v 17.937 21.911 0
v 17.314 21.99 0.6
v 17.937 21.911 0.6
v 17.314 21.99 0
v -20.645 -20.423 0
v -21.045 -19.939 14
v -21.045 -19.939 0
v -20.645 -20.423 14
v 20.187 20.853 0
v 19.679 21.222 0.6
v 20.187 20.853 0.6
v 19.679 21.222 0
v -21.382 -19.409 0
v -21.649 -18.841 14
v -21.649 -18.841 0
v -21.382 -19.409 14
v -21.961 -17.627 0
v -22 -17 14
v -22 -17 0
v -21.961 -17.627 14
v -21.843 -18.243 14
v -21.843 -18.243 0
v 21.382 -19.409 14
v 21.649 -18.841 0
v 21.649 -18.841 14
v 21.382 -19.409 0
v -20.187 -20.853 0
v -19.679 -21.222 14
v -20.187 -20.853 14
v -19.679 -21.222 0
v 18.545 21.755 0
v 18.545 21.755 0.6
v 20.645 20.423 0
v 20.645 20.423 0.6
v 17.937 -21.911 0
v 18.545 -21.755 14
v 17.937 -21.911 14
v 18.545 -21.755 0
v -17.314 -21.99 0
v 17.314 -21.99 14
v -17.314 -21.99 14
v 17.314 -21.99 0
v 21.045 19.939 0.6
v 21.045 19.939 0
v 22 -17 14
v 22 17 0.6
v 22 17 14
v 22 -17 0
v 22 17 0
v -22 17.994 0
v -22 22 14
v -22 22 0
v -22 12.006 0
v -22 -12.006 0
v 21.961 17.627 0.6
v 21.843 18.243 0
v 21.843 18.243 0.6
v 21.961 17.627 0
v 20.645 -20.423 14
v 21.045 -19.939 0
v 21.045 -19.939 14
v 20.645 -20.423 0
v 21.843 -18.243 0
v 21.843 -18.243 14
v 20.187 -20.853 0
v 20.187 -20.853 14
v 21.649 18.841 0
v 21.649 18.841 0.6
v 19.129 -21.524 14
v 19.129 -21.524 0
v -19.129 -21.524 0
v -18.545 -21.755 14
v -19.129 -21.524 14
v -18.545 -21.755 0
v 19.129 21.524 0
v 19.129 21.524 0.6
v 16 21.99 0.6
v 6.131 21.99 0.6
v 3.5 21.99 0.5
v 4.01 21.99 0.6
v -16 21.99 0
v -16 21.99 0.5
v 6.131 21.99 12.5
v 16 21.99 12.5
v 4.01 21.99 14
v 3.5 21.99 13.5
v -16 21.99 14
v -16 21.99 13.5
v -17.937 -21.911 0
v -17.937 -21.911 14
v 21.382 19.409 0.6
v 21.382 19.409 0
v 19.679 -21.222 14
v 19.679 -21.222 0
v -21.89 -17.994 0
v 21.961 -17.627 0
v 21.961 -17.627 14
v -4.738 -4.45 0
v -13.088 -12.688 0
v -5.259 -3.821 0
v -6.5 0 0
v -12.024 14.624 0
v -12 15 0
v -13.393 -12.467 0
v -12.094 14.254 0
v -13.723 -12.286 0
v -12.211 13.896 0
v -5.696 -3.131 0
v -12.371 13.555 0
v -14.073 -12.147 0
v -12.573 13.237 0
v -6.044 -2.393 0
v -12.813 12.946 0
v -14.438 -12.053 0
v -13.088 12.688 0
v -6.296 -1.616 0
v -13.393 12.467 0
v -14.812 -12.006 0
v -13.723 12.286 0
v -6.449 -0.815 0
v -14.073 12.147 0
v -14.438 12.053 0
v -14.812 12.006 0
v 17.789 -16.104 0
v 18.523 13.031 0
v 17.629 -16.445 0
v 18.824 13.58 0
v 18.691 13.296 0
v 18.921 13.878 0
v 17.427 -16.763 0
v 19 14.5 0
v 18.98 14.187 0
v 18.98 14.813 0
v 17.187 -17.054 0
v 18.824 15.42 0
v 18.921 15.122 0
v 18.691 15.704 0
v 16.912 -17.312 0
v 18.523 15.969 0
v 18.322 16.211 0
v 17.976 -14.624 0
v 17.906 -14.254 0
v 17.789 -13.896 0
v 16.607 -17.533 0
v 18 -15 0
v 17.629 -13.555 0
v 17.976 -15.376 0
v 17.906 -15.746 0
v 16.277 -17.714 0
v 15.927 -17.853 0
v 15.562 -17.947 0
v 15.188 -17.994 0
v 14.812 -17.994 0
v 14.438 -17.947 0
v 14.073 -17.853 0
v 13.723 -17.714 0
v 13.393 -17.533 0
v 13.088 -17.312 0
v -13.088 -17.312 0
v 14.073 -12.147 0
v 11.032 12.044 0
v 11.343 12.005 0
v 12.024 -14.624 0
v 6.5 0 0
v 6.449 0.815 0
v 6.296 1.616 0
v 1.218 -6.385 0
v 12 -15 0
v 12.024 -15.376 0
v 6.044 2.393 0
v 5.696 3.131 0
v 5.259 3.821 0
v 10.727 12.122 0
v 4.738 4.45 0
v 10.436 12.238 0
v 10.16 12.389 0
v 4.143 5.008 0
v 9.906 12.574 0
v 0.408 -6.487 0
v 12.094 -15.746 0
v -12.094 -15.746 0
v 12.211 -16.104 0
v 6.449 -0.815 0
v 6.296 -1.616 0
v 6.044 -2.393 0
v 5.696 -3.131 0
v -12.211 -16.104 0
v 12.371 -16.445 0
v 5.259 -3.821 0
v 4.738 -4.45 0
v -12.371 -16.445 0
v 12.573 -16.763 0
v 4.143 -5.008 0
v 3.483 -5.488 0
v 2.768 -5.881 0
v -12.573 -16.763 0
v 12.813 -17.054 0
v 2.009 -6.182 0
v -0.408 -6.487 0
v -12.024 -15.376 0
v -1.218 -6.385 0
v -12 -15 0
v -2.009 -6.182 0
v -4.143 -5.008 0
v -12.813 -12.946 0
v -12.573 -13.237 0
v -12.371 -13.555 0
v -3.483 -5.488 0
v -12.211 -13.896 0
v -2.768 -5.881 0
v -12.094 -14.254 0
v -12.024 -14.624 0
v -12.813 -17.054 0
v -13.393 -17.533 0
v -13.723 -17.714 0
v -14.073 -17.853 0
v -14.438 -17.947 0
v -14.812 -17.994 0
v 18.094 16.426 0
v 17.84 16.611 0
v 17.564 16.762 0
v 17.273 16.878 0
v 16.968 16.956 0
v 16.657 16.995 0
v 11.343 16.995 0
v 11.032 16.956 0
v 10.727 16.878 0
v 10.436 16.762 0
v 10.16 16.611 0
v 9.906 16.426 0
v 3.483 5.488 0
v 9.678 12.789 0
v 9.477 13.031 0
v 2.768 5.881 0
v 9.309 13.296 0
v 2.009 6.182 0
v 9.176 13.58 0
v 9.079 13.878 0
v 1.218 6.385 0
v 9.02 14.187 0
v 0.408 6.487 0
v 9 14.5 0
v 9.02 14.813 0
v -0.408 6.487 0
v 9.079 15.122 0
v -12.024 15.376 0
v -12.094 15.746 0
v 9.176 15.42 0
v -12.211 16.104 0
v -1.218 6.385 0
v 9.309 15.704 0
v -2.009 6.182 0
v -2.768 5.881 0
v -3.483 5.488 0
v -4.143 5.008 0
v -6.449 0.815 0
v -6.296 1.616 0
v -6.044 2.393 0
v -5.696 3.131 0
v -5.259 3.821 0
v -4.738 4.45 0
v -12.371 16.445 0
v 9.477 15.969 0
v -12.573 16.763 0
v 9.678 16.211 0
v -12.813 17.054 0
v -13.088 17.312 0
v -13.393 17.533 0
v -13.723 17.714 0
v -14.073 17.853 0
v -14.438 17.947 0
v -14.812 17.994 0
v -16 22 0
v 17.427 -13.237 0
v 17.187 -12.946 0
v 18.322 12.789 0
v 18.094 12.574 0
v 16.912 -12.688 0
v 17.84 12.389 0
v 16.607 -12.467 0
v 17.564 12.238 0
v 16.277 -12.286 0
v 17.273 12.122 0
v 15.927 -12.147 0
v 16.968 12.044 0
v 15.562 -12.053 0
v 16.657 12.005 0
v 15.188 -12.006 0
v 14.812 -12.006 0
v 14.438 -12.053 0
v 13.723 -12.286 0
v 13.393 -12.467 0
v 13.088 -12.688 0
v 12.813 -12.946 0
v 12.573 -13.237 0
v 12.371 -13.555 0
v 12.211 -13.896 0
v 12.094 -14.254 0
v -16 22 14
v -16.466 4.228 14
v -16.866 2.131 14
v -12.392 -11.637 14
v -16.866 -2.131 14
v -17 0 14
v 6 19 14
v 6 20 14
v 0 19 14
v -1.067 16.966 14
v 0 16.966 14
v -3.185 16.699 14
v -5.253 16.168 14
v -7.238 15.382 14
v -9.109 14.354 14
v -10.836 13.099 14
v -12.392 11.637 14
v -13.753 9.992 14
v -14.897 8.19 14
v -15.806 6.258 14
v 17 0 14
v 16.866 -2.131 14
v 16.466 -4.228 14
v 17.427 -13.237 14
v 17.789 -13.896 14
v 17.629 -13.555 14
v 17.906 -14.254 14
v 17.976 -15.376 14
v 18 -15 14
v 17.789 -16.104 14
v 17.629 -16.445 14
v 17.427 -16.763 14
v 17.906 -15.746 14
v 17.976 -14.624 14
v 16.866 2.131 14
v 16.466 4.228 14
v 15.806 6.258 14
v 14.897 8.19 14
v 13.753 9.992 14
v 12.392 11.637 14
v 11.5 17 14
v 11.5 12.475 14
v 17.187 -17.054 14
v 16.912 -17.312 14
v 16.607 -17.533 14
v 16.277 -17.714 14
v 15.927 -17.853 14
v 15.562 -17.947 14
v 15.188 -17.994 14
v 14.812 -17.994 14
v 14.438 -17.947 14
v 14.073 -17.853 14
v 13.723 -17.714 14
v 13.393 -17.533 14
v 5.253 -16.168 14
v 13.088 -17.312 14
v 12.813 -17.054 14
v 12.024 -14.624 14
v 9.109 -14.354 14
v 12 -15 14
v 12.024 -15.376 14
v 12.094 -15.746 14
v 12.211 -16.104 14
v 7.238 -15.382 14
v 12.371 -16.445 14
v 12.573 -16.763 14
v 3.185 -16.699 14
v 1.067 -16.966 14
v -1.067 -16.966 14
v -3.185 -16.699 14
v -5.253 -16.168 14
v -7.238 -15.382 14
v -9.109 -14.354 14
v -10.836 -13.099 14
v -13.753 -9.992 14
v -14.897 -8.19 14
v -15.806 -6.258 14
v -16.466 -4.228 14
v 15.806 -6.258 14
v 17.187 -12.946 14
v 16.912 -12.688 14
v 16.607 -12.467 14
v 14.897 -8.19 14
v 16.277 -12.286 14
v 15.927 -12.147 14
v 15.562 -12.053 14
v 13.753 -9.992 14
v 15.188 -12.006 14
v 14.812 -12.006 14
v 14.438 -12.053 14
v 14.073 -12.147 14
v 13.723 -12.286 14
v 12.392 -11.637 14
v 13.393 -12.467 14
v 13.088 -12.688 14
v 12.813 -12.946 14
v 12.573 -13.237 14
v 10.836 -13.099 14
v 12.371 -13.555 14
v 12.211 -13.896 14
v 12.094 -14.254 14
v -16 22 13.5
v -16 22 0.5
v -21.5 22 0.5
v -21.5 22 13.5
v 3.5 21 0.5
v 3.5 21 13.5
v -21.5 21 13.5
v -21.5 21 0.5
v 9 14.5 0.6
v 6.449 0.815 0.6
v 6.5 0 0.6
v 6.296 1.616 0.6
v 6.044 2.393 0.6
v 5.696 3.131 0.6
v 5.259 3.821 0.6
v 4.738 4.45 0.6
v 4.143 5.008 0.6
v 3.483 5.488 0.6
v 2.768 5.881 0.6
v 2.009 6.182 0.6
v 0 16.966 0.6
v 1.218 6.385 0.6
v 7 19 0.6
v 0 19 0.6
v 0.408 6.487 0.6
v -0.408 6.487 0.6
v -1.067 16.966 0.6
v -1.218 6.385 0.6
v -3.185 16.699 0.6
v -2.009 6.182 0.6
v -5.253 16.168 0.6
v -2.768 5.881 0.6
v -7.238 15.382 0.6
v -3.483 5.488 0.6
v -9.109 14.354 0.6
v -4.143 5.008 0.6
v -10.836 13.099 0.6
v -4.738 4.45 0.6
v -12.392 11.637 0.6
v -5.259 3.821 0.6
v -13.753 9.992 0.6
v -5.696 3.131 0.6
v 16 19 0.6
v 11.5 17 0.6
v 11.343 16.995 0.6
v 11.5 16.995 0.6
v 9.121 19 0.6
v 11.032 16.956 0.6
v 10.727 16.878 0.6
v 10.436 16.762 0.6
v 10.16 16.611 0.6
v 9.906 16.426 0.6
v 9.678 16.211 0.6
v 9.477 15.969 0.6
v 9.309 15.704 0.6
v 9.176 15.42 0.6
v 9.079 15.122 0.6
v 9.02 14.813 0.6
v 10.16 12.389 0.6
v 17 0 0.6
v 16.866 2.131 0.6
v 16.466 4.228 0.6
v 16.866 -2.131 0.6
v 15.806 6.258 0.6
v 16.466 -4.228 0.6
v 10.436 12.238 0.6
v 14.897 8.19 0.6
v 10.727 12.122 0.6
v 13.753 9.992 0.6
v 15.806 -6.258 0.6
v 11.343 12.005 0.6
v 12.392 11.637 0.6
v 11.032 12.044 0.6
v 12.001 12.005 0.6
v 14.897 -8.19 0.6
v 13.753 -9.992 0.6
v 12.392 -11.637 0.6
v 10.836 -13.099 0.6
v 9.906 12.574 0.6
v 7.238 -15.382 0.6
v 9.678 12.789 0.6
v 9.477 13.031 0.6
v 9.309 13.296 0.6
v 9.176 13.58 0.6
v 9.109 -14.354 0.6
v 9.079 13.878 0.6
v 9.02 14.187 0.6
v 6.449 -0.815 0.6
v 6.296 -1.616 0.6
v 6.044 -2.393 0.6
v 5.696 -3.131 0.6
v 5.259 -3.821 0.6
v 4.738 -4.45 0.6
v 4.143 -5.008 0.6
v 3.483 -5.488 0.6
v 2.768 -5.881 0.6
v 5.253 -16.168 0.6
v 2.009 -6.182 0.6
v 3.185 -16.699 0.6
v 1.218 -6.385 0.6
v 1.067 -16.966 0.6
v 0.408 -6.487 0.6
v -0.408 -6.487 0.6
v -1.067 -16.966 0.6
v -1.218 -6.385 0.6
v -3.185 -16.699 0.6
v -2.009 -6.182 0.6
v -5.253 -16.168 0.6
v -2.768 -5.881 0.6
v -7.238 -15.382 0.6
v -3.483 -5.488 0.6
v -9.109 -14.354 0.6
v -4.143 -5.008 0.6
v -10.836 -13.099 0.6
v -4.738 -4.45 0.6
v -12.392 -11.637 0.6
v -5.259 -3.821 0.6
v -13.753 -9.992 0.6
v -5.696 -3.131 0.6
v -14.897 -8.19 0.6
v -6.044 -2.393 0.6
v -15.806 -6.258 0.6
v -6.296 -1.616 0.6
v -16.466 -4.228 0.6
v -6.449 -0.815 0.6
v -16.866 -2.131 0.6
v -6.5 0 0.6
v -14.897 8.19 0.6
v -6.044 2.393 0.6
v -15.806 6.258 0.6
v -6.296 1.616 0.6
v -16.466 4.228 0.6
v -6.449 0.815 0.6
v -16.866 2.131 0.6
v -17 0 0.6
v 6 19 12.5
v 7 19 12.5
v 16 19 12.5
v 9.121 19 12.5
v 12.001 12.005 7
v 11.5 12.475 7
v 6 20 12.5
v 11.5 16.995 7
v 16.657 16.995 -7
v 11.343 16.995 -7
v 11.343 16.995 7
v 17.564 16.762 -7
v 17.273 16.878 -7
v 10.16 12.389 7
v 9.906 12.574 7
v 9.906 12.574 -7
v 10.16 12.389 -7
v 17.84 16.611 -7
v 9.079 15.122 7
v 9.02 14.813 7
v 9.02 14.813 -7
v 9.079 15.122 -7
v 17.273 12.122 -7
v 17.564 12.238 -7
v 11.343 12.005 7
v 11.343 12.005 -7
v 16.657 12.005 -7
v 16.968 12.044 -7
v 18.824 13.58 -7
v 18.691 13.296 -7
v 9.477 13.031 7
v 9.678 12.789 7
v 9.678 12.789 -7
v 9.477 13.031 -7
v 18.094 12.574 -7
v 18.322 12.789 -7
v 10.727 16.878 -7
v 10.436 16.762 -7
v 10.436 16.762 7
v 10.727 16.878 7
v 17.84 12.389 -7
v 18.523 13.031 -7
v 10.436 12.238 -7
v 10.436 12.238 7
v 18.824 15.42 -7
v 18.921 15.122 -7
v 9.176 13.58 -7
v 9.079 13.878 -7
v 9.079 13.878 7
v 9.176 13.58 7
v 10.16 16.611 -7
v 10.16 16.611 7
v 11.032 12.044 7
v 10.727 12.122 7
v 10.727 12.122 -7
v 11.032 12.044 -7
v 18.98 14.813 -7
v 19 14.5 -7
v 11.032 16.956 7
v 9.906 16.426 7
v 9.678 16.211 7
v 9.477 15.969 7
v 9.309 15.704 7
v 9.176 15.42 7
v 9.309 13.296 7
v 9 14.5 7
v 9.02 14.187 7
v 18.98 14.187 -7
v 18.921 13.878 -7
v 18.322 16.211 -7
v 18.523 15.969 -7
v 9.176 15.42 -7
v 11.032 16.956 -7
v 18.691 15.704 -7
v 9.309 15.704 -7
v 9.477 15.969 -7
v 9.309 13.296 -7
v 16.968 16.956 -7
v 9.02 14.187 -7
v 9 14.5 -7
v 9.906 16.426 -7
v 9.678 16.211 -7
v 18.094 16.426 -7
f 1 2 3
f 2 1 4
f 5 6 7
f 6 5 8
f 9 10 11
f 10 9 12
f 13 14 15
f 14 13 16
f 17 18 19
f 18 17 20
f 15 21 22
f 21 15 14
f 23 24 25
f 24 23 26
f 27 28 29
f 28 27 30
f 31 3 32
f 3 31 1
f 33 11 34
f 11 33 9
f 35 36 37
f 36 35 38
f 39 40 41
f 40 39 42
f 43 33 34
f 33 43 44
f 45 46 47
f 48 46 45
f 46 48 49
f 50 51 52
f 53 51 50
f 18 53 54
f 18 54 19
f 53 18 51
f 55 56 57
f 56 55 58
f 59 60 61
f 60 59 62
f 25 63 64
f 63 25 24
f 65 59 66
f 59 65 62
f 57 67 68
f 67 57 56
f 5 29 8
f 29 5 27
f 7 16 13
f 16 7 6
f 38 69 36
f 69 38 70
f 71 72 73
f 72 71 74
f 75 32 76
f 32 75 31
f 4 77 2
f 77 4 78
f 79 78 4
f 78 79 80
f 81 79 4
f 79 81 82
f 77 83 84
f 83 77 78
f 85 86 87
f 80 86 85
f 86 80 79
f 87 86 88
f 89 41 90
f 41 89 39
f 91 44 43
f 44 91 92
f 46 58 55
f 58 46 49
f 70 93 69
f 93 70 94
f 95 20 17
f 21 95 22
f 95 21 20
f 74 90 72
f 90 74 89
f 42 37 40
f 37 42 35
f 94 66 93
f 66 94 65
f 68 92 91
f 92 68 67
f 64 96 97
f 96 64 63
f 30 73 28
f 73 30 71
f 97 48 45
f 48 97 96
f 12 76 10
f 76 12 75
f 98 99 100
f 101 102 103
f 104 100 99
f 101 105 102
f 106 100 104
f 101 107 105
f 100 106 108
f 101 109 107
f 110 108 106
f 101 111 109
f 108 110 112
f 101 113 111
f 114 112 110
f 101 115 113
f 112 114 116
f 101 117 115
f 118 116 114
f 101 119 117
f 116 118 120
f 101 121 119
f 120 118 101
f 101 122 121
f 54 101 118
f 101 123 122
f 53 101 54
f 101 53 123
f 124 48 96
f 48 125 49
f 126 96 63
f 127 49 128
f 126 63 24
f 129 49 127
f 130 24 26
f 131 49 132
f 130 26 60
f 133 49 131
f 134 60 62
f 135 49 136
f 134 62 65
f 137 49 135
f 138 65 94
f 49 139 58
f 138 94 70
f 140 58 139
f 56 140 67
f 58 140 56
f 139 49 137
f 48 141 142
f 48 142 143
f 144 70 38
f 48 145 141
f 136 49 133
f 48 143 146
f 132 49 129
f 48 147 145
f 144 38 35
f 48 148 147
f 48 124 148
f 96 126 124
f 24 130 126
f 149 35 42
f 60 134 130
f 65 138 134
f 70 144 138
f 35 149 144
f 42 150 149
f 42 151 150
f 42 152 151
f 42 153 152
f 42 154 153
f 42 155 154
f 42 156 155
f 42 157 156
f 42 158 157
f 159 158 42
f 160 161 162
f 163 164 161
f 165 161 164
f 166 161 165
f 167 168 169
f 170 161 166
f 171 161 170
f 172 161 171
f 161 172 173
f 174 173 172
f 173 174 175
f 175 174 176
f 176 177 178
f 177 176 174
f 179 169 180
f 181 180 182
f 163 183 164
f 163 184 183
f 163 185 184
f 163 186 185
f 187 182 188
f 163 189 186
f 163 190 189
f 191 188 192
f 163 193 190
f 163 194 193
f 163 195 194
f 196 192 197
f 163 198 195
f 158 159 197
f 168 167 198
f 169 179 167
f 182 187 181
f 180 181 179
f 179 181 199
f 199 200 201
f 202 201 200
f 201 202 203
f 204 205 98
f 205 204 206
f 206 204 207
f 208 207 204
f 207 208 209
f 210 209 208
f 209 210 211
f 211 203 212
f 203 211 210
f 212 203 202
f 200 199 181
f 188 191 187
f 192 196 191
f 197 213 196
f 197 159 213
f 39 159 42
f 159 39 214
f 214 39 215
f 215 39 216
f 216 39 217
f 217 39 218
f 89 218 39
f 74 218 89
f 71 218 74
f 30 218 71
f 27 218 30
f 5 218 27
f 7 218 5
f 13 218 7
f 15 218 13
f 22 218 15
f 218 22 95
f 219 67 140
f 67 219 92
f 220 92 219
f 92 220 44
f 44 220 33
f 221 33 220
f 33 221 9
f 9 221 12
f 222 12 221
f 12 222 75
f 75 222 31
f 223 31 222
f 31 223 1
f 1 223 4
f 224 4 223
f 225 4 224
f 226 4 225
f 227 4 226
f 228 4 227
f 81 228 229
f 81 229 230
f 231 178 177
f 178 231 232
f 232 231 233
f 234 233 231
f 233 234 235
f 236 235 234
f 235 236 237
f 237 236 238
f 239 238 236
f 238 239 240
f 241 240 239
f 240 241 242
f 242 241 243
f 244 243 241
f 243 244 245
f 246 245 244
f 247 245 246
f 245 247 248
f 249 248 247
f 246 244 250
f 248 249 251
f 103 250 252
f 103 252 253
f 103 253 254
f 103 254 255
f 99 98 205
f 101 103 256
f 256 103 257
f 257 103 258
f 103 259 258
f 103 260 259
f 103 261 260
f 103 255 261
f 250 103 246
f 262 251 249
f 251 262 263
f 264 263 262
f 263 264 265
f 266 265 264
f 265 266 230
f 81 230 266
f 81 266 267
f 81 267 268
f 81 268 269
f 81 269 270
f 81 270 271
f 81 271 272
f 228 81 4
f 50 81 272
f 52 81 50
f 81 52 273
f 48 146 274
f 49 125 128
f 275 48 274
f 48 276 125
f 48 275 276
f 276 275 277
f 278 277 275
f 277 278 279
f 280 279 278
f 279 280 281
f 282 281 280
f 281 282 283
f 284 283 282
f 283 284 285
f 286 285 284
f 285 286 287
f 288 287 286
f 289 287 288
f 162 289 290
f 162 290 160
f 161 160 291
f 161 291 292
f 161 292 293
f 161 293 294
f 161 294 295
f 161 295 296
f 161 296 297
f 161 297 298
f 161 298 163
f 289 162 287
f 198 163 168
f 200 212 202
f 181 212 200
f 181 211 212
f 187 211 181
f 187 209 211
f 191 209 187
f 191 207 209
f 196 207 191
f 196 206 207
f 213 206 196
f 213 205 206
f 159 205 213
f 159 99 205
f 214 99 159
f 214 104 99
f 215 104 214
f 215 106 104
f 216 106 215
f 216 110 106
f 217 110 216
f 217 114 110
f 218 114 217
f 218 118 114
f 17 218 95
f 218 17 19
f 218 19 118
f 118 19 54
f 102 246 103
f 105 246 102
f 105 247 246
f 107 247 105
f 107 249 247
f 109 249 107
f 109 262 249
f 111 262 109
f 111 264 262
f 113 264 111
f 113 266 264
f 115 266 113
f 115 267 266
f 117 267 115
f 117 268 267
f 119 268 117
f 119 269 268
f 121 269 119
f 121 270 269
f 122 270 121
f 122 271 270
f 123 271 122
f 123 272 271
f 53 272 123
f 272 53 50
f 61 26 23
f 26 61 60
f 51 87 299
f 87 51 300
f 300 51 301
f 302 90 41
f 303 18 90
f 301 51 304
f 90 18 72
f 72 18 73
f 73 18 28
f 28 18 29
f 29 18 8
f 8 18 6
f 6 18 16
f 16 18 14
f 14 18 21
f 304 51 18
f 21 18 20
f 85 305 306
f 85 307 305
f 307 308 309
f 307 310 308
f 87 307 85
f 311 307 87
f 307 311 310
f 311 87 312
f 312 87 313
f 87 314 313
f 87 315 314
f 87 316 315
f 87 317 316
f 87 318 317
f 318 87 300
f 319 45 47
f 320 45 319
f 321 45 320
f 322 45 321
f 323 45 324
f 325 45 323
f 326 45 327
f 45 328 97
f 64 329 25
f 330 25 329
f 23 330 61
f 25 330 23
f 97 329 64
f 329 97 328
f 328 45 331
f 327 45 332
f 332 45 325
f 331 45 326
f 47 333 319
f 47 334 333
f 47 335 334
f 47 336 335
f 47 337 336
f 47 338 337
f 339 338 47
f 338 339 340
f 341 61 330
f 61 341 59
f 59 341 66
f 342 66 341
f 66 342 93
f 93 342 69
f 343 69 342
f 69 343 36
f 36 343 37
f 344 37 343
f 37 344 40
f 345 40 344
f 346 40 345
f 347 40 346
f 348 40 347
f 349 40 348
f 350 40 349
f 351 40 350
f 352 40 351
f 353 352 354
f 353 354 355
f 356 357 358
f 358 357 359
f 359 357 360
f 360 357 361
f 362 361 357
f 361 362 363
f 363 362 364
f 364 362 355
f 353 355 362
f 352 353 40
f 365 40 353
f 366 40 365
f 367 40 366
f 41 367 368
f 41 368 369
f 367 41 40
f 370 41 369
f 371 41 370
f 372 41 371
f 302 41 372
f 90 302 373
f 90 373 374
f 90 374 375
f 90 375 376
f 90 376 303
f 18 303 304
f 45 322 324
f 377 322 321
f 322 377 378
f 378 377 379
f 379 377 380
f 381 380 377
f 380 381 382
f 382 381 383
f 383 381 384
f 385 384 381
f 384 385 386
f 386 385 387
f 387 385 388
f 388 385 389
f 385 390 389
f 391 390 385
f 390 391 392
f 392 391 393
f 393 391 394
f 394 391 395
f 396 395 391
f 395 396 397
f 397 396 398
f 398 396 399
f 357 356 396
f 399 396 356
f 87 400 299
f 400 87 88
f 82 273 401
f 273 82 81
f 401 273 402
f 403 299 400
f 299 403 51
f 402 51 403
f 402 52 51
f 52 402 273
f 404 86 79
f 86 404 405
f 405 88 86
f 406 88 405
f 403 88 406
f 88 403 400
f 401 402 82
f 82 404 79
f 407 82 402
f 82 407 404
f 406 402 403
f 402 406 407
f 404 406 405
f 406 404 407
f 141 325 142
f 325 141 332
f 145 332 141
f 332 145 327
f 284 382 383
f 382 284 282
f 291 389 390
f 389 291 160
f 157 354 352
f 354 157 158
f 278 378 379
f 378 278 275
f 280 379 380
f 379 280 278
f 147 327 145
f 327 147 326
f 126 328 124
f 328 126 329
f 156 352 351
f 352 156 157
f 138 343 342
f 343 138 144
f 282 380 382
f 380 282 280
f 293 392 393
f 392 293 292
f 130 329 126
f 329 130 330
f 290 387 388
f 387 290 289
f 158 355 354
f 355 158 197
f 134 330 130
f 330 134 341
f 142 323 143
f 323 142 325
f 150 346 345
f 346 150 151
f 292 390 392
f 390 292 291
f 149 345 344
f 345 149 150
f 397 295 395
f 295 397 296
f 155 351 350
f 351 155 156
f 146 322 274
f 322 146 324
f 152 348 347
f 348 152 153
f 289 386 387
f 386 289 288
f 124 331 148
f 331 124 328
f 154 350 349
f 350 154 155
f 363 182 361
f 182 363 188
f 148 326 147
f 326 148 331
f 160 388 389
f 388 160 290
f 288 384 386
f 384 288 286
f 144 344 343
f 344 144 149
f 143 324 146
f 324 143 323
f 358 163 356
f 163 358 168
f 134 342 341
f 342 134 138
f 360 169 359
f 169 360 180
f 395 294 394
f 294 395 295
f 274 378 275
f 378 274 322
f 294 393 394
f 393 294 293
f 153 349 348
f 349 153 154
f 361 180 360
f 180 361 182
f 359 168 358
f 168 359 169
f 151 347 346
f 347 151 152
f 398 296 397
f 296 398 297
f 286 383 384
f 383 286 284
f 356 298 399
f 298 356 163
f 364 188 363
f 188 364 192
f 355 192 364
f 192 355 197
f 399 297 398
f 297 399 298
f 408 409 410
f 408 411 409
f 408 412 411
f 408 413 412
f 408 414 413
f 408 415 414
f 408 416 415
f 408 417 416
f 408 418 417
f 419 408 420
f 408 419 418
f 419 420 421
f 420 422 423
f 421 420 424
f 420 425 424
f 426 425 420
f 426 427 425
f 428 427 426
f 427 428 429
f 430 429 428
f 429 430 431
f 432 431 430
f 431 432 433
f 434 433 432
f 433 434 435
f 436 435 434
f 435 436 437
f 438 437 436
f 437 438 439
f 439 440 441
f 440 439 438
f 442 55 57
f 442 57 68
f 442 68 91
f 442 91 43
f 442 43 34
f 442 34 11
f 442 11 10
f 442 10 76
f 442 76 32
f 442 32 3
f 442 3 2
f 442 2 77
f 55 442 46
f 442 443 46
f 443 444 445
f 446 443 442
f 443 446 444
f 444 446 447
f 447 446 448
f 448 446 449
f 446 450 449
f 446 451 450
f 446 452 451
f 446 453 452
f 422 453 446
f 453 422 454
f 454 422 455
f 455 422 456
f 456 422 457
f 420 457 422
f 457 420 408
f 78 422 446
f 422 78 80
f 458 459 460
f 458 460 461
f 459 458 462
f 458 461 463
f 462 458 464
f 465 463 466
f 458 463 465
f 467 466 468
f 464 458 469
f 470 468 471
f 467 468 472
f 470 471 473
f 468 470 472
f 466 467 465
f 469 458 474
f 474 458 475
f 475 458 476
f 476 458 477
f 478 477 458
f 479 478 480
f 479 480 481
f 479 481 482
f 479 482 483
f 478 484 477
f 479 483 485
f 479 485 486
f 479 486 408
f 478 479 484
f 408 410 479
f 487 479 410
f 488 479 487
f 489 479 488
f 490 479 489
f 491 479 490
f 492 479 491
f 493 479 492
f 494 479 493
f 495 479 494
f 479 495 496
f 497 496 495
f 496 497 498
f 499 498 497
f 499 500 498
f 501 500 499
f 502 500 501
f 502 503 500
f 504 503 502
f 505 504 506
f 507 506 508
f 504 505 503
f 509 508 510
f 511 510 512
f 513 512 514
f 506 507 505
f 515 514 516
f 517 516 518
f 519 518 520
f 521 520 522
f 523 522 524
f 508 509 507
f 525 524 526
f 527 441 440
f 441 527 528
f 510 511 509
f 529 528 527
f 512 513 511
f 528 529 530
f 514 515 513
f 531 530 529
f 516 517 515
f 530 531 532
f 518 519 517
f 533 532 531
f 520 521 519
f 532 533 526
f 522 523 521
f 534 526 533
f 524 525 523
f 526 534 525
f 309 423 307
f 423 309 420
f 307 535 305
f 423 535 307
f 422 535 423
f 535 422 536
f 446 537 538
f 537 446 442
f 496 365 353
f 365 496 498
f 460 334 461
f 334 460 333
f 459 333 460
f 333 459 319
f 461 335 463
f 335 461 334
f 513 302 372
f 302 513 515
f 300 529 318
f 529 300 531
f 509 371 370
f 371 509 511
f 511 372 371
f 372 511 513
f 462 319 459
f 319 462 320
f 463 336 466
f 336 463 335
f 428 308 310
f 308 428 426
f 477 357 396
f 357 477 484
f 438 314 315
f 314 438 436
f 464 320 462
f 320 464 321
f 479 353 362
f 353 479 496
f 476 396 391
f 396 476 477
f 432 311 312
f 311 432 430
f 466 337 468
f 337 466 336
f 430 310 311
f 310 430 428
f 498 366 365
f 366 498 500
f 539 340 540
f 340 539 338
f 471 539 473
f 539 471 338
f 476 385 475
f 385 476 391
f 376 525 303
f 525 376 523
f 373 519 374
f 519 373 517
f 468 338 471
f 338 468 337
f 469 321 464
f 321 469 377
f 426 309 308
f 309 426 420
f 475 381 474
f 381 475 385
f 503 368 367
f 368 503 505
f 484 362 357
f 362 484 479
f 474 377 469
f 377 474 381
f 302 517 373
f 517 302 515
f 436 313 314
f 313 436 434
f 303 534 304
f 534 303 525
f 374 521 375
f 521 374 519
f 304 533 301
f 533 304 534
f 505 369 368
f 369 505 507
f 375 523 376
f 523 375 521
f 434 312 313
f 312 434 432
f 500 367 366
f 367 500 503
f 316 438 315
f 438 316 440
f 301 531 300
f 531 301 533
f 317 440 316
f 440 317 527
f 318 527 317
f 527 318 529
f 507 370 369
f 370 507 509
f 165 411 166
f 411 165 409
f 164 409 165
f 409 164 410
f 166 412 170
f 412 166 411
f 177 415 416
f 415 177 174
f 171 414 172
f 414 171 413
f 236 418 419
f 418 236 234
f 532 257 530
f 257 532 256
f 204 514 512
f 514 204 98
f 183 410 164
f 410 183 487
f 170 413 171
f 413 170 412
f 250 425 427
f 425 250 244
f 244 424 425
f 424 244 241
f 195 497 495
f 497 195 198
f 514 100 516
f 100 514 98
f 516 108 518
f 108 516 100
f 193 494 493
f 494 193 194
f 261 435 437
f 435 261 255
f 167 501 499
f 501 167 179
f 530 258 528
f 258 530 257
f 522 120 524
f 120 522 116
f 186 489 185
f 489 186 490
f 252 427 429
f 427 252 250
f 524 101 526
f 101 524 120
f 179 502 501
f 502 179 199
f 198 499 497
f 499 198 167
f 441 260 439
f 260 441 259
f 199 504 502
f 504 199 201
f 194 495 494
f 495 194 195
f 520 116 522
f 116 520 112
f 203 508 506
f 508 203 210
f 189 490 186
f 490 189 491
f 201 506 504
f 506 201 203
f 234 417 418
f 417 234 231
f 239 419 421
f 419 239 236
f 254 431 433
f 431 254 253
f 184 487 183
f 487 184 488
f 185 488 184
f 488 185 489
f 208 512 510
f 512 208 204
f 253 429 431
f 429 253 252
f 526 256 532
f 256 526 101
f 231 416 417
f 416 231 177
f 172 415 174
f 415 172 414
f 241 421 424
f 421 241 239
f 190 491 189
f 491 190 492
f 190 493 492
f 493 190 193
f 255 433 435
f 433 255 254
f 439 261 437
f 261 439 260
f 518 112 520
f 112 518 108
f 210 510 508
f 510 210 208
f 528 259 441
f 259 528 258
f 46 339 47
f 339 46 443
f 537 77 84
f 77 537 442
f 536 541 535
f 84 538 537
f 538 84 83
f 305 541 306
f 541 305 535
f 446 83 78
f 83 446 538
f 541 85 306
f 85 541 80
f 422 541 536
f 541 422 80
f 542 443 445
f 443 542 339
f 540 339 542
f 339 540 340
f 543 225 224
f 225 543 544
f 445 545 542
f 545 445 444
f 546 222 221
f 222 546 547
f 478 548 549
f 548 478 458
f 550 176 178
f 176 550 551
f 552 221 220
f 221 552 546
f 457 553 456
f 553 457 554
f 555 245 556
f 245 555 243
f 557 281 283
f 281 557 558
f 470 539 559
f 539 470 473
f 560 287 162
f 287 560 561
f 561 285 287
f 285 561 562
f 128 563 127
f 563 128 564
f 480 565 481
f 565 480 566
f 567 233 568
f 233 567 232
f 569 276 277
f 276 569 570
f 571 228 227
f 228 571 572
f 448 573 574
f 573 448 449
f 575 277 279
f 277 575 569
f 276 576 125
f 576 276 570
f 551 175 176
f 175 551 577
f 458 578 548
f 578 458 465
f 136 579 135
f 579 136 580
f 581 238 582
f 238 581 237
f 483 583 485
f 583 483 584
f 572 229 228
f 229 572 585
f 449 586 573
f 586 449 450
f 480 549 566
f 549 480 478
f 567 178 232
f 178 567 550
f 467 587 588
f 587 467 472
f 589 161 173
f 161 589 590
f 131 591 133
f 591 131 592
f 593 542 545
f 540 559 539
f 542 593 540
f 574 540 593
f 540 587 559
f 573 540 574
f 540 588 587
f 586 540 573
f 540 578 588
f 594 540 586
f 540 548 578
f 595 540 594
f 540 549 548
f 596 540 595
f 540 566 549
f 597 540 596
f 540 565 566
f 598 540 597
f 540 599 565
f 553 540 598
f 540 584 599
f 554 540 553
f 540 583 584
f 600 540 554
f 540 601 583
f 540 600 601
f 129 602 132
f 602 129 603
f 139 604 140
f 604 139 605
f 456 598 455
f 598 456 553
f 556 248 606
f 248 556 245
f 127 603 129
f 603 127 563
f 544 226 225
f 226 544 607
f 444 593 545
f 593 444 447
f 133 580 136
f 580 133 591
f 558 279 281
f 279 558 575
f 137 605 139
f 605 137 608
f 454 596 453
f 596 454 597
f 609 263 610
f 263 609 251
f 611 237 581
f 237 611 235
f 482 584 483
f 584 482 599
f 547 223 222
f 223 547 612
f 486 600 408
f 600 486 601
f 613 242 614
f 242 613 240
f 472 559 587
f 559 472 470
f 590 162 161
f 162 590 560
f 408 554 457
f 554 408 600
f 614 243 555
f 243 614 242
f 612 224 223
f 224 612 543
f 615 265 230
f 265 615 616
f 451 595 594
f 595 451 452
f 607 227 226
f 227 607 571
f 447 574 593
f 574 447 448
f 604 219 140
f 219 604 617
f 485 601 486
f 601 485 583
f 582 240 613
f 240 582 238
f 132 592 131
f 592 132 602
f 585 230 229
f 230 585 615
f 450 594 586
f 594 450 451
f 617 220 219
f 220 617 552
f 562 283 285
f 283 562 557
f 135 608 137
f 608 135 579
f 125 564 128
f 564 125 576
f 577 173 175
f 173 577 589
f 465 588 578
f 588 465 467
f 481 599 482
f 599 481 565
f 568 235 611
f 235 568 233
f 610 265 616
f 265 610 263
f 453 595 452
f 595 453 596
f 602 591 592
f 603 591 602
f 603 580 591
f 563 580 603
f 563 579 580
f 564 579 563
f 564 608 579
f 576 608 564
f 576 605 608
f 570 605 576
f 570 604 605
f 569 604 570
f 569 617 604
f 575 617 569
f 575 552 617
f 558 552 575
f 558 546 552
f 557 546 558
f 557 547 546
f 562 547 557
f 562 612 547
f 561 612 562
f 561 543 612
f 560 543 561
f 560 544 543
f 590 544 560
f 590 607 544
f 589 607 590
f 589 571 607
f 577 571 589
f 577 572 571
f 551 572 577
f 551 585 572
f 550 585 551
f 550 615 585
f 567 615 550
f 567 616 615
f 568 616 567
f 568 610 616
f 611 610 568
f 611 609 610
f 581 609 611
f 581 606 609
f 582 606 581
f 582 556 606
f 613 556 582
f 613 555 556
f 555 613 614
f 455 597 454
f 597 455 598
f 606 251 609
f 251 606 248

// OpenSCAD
$fn = 50;


union() {
	difference() {
		union() {
			hull() {
				translate(v = [-17.0000000000, 17.0000000000, 0]) {
					cylinder(h = 14, r = 5);
				}
				translate(v = [17.0000000000, 17.0000000000, 0]) {
					cylinder(h = 14, r = 5);
				}
				translate(v = [-17.0000000000, -17.0000000000, 0]) {
					cylinder(h = 14, r = 5);
				}
				translate(v = [17.0000000000, -17.0000000000, 0]) {
					cylinder(h = 14, r = 5);
				}
			}
			translate(v = [-22.0000000000, 16.0000000000, 0]) {
				cube(size = [6, 6, 14]);
			}
		}
		union() {
			translate(v = [-22.5000000000, -15.0000000000, -250.0000000000]) {
				rotate(a = [0, 0, 0]) {
					difference() {
						union() {
							hull() {
								translate(v = [7.5000000000, 0, 0]) {
									cylinder(h = 250, r = 3.0000000000, r1 = 3.0000000000, r2 = 3.0000000000);
								}
								translate(v = [-7.5000000000, 0, 0]) {
									cylinder(h = 250, r = 3.0000000000, r1 = 3.0000000000, r2 = 3.0000000000);
								}
							}
						}
						union();
					}
				}
			}
			translate(v = [-22.5000000000, 15.0000000000, -250.0000000000]) {
				rotate(a = [0, 0, 0]) {
					difference() {
						union() {
							hull() {
								translate(v = [7.5000000000, 0, 0]) {
									cylinder(h = 250, r = 3.0000000000, r1 = 3.0000000000, r2 = 3.0000000000);
								}
								translate(v = [-7.5000000000, 0, 0]) {
									cylinder(h = 250, r = 3.0000000000, r1 = 3.0000000000, r2 = 3.0000000000);
								}
							}
						}
						union();
					}
				}
			}
			translate(v = [-21.5000000000, 21.0000000000, 0.5000000000]) {
				cube(size = [25, 1, 13.0000000000]);
			}
			translate(v = [15.0000000000, -15.0000000000, 0]) {
				cylinder(h = 100, r = 3.0000000000);
			}
			translate(v = [0.0000000000, 11.0000000000, 0.6000000000]) {
				cube(size = [11, 8, 16.4000000000]);
			}
			translate(v = [0, 0, 0.6000000000]) {
				cylinder(h = 16.4000000000, r = 17.0000000000);
			}
			translate(v = [0, 0, -7.0000000000]) {
				cylinder(h = 14, r = 6.5000000000);
			}
			translate(v = [0.0000000000, 17.0000000000, 0.6000000000]) {
				cube(size = [22.0000000000, 2, 16.4000000000]);
			}
			translate(v = [16.0000000000, 17.0000000000, 0.6000000000]) {
				cube(size = [6, 5, 16.4000000000]);
			}
			translate(v = [6.0000000000, 17.0000000000, 12.5000000000]) {
				cube(size = [16, 5, 1.5000000000]);
			}
			translate(v = [3.2500000000, 22.7500000000, 0.6000000000]) {
				rotate(a = [0, 0, -45]) {
					cube(size = [7.5000000000, 1.5000000000, 16.4000000000]);
				}
			}
			translate(v = [2.5000000000, 12.0000000000, 0.6000000000]) {
				cube(size = [9.0000000000, 5, 13.4000000000]);
			}
		}
	}
	union() {
		translate(v = [14, 14.5000000000, -7.0000000000]) {
			rotate(a = [0, 0, 0]) {
				difference() {
					union() {
						#hull() {
							#translate(v = [2.5000000000, 0, 0]) {
								cylinder(h = 14, r = 2.5000000000, r1 = 2.5000000000, r2 = 2.5000000000);
							}
							#translate(v = [-2.5000000000, 0, 0]) {
								cylinder(h = 14, r = 2.5000000000, r1 = 2.5000000000, r2 = 2.5000000000);
							}
						}
					}
					union();
				}
			}
		}
	}
}
